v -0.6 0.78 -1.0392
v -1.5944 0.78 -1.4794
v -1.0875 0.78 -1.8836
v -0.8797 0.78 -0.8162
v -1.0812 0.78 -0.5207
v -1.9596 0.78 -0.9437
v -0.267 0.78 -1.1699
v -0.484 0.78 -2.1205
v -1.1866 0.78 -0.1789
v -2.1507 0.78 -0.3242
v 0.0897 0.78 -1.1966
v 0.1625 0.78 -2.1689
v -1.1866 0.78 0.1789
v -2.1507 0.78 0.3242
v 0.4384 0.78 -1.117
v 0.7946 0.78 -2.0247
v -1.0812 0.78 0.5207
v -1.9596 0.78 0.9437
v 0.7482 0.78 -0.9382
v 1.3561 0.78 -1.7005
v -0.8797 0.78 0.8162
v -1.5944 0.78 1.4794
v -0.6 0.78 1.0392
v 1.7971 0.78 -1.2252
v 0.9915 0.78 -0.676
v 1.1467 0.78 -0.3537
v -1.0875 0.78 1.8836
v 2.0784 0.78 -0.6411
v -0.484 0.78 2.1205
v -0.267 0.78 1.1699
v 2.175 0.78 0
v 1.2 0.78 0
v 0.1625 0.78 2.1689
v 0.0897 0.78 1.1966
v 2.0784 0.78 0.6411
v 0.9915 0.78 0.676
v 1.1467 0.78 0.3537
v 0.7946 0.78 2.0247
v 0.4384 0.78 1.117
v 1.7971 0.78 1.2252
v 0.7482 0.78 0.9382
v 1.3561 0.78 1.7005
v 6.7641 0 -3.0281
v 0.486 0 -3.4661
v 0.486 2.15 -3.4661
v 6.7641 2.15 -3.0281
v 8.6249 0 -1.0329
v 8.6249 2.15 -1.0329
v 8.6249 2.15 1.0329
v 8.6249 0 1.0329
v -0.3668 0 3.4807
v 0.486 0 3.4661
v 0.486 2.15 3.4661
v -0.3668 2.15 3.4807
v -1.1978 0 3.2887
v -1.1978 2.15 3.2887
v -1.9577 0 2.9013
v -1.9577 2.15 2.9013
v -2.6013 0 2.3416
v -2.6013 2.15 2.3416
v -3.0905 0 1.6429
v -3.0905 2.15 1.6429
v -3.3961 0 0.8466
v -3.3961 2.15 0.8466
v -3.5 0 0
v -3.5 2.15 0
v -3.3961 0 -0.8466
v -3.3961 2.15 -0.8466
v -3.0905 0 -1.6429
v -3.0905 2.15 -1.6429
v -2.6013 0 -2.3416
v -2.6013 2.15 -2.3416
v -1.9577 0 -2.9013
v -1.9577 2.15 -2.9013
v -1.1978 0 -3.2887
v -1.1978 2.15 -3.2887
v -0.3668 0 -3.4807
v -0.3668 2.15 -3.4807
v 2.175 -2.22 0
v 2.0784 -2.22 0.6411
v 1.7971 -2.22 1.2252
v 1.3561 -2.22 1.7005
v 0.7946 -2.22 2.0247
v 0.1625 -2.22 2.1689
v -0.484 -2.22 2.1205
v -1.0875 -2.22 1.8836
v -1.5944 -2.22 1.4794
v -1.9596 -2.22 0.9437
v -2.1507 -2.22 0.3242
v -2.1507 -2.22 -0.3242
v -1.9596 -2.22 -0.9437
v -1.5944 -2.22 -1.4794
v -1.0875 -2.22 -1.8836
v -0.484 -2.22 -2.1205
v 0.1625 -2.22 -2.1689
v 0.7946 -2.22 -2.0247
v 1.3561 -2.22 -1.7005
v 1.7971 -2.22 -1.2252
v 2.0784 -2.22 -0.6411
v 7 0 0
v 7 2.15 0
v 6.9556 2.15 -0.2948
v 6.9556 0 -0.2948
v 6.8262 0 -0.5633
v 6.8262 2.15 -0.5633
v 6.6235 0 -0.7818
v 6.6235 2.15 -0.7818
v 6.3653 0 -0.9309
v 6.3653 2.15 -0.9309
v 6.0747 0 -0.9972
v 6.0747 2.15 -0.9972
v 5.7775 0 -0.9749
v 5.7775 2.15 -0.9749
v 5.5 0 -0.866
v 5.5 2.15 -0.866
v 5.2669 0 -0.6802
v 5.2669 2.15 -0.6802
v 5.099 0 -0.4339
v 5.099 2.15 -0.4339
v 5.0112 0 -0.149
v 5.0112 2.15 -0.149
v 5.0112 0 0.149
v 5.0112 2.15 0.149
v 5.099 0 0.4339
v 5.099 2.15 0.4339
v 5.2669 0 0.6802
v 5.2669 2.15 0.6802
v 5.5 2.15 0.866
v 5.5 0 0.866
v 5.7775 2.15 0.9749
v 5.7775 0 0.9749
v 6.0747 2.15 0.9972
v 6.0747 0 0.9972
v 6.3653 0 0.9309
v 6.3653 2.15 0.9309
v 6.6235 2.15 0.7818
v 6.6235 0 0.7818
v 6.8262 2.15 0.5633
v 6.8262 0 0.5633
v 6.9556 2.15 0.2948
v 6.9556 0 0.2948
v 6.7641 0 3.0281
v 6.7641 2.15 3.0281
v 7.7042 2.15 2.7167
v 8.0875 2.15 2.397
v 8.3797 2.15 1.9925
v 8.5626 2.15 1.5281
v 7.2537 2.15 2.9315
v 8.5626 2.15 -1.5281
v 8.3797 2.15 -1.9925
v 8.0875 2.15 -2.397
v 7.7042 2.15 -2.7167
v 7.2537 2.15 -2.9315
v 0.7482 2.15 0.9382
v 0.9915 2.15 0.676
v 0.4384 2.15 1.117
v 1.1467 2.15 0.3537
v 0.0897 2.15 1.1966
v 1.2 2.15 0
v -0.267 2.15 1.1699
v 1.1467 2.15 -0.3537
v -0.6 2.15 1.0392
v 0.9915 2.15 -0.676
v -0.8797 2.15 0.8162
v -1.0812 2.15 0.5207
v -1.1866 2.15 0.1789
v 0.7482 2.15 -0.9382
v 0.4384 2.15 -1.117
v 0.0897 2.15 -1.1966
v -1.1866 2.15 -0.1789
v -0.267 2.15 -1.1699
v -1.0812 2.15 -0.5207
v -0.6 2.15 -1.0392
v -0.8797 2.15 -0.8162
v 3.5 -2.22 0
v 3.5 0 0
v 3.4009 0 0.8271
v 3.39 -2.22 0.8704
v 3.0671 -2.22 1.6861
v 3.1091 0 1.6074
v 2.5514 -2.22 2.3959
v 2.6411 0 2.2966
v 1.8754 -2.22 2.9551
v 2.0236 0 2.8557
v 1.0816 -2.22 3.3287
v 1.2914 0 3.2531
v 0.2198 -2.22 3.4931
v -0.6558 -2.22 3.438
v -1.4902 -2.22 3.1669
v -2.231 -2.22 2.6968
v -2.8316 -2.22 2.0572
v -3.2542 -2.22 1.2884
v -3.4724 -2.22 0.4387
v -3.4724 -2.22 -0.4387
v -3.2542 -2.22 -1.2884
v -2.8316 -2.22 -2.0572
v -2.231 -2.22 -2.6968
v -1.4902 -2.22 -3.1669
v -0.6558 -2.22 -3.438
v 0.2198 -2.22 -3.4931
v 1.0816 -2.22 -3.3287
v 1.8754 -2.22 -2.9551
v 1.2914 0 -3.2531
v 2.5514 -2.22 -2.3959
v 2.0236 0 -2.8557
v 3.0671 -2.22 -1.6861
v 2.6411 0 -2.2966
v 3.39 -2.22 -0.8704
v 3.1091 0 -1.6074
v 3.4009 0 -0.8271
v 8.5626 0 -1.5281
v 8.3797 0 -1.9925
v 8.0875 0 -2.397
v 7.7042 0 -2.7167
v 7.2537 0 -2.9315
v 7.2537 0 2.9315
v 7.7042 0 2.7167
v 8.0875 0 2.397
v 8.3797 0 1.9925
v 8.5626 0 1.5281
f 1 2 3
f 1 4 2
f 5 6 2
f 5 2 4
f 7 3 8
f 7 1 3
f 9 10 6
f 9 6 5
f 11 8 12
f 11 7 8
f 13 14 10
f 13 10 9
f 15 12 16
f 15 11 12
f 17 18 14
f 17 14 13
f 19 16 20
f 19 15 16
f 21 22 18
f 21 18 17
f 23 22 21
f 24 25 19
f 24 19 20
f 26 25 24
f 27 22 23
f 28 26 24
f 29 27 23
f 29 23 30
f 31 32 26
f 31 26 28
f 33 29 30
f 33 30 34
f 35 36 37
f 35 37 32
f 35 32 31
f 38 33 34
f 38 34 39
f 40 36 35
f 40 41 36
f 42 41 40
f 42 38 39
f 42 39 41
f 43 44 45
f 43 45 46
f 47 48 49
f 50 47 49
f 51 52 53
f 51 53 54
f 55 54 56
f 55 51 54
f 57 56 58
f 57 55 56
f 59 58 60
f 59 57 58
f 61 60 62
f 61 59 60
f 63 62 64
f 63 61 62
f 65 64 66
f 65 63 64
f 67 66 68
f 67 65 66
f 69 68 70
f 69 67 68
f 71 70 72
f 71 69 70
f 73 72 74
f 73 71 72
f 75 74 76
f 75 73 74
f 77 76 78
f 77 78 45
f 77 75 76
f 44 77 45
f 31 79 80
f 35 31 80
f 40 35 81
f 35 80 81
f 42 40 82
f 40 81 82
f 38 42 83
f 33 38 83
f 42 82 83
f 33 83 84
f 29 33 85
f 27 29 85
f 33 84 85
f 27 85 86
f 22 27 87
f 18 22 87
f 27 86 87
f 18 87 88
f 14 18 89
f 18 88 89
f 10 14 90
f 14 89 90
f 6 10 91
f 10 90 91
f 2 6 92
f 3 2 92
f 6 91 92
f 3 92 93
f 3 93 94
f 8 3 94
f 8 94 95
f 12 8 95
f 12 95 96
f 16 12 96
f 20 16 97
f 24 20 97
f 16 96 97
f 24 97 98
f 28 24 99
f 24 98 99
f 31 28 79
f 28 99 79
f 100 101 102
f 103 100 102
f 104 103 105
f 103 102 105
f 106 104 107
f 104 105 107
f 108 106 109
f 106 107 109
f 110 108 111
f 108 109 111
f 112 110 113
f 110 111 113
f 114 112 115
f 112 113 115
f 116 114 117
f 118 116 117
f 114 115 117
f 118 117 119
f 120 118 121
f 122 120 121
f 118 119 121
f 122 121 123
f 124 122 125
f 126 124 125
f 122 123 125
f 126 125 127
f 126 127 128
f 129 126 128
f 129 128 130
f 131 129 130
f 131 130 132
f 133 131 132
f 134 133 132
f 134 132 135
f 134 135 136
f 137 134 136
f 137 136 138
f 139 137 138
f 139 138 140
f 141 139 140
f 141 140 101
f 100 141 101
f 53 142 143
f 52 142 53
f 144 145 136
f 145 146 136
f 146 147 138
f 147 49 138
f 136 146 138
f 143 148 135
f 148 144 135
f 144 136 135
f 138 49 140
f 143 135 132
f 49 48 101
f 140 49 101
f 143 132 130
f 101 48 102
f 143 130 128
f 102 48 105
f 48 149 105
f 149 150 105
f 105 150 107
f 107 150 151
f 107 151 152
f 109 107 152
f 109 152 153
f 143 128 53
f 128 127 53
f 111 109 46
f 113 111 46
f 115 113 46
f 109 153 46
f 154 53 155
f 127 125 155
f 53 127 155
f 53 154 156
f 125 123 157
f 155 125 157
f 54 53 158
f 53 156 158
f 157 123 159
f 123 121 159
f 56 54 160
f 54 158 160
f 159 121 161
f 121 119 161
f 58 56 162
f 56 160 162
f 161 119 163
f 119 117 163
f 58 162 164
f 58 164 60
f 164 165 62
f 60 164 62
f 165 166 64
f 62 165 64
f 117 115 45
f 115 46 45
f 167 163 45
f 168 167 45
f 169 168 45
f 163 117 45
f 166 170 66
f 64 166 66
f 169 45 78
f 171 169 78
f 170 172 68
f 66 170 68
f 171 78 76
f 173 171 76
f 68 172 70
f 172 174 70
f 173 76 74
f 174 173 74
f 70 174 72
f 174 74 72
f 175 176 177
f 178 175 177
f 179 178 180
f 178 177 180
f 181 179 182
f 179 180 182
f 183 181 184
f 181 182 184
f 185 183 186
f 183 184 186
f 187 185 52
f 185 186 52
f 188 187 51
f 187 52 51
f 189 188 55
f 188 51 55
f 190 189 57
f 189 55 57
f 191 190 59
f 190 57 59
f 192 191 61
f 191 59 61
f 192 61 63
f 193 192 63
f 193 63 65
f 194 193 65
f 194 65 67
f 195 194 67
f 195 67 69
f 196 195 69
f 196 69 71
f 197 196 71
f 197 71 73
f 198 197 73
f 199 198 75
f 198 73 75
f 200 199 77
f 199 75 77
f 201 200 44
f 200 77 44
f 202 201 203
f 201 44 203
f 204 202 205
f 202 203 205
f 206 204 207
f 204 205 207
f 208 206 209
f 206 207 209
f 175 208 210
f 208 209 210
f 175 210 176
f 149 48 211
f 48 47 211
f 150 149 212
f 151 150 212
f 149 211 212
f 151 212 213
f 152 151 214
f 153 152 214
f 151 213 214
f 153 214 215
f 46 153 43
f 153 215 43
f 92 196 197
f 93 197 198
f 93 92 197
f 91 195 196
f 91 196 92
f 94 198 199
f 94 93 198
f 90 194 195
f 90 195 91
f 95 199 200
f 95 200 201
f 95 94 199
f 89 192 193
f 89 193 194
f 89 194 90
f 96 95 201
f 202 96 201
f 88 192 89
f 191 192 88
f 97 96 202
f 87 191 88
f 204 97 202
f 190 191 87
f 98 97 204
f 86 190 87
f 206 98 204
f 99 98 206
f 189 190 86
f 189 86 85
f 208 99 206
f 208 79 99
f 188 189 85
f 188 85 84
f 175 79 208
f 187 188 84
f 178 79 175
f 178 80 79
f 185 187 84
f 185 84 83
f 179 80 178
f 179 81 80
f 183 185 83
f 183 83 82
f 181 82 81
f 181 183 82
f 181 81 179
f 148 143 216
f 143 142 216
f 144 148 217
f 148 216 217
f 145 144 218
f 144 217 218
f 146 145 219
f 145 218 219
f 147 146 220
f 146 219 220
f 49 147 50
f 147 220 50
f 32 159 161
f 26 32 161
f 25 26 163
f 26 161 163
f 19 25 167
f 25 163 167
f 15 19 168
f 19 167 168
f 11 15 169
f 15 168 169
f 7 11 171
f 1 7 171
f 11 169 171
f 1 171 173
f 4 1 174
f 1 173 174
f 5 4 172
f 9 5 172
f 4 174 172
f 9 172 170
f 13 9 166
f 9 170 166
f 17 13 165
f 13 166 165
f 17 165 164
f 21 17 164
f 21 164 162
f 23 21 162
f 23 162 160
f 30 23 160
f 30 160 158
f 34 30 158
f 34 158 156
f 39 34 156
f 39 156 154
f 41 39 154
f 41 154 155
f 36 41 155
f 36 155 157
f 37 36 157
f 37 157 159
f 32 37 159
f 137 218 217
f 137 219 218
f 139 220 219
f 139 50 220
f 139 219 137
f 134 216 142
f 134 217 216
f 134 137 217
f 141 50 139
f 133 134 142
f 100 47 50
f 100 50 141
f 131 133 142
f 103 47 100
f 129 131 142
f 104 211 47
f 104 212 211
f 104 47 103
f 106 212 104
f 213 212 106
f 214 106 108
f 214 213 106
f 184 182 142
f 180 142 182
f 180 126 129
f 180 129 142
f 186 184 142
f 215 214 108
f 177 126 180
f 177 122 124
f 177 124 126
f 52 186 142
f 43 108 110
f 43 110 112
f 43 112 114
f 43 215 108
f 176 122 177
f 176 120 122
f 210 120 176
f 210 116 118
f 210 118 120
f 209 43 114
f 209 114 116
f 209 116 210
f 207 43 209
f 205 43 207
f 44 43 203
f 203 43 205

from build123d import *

# Parameters (mm, degrees)
SALIENTE_EXTRUIR1_DEPTH = 2.15
CROQUIS2_R              = 3.5
SALIENTE_EXTRUIR2_DEPTH = 2.22
CROQUIS3_R              = 1.2
CORTAR_EXTRUIR1_DEPTH   = 7.22
CROQUIS4_R              = 2.175
CORTAR_EXTRUIR2_DEPTH   = 3
CROQUIS5_R              = 1
CORTAR_EXTRUIR3_DEPTH   = 10
CUT_EXTRUDE1_DEPTH      = 10
FILLET1_R               = 2


with BuildPart() as part:
    # Croquis1 → Saliente-Extruir1 (new body)
    with BuildSketch(Plane(origin=(0, 0, 0), x_dir=(1, 0, 0), z_dir=(0, 1, 0))):
        with BuildLine():
            Line((0.486006459, 3.466092573), (21.5, 2))
            ThreePointArc((21.5, 2), (23.5, 0), (21.5, -2))
            Line((21.5, -2), (0.486006459, -3.466092573))
            ThreePointArc((0.486006459, -3.466092573), (-3.5, 0), (0.486006459, 3.466092573))
        make_face()
    extrude(amount=SALIENTE_EXTRUIR1_DEPTH)

    # Croquis2 → Saliente-Extruir2 (add)
    with BuildSketch(Plane.XZ):
        Circle(CROQUIS2_R)
    extrude(amount=SALIENTE_EXTRUIR2_DEPTH)

    # Croquis3 → Cortar-Extruir1 (cut)
    with BuildSketch(Plane(origin=(0, 2.15, 0), x_dir=(1, 0, 0), z_dir=(0, 1, 0))):
        Circle(CROQUIS3_R)
    extrude(amount=-CORTAR_EXTRUIR1_DEPTH, mode=Mode.SUBTRACT)

    # Croquis4 → Cortar-Extruir2 (cut)
    with BuildSketch(Plane.XZ.offset(2.22)):
        Circle(CROQUIS4_R)
    extrude(amount=-CORTAR_EXTRUIR2_DEPTH, mode=Mode.SUBTRACT)

    # Croquis5 → Cortar-Extruir3 (cut)
    with BuildSketch(Plane(origin=(0, 2.15, 0), x_dir=(1, 0, 0), z_dir=(0, 1, 0))):
        with Locations((21.5, 0)):
            Circle(CROQUIS5_R)
        with Locations((15.5, 0)):
            Circle(CROQUIS5_R)
        with Locations((6, 0)):
            Circle(CROQUIS5_R)
    extrude(amount=-CORTAR_EXTRUIR3_DEPTH, mode=Mode.SUBTRACT)

    # Sketch1 → Cut-Extrude1 (cut)
    with BuildSketch(Plane(origin=(0, 2.15, 0), x_dir=(1, 0, 0), z_dir=(0, 1, 0))):
        with BuildLine():
            Line((21.5, 2), (8.624907291, 2.898262282))
            Line((8.624907291, 2.898262282), (8.624907291, -2.898262282))
            Line((8.624907291, -2.898262282), (21.5, -2))
            ThreePointArc((21.5, -2), (23.5, 0), (21.5, 2))
        make_face()
    extrude(amount=-CUT_EXTRUDE1_DEPTH, mode=Mode.SUBTRACT)

    # Fillet1
    fillet1_edges = [part.edges().sort_by_distance(p)[0] for p in [
        (8.624907291, 1.075, 2.898262282),
        (8.624907291, 1.075, -2.898262282),
    ]]
    fillet(fillet1_edges, radius=FILLET1_R)


solid = part.part
